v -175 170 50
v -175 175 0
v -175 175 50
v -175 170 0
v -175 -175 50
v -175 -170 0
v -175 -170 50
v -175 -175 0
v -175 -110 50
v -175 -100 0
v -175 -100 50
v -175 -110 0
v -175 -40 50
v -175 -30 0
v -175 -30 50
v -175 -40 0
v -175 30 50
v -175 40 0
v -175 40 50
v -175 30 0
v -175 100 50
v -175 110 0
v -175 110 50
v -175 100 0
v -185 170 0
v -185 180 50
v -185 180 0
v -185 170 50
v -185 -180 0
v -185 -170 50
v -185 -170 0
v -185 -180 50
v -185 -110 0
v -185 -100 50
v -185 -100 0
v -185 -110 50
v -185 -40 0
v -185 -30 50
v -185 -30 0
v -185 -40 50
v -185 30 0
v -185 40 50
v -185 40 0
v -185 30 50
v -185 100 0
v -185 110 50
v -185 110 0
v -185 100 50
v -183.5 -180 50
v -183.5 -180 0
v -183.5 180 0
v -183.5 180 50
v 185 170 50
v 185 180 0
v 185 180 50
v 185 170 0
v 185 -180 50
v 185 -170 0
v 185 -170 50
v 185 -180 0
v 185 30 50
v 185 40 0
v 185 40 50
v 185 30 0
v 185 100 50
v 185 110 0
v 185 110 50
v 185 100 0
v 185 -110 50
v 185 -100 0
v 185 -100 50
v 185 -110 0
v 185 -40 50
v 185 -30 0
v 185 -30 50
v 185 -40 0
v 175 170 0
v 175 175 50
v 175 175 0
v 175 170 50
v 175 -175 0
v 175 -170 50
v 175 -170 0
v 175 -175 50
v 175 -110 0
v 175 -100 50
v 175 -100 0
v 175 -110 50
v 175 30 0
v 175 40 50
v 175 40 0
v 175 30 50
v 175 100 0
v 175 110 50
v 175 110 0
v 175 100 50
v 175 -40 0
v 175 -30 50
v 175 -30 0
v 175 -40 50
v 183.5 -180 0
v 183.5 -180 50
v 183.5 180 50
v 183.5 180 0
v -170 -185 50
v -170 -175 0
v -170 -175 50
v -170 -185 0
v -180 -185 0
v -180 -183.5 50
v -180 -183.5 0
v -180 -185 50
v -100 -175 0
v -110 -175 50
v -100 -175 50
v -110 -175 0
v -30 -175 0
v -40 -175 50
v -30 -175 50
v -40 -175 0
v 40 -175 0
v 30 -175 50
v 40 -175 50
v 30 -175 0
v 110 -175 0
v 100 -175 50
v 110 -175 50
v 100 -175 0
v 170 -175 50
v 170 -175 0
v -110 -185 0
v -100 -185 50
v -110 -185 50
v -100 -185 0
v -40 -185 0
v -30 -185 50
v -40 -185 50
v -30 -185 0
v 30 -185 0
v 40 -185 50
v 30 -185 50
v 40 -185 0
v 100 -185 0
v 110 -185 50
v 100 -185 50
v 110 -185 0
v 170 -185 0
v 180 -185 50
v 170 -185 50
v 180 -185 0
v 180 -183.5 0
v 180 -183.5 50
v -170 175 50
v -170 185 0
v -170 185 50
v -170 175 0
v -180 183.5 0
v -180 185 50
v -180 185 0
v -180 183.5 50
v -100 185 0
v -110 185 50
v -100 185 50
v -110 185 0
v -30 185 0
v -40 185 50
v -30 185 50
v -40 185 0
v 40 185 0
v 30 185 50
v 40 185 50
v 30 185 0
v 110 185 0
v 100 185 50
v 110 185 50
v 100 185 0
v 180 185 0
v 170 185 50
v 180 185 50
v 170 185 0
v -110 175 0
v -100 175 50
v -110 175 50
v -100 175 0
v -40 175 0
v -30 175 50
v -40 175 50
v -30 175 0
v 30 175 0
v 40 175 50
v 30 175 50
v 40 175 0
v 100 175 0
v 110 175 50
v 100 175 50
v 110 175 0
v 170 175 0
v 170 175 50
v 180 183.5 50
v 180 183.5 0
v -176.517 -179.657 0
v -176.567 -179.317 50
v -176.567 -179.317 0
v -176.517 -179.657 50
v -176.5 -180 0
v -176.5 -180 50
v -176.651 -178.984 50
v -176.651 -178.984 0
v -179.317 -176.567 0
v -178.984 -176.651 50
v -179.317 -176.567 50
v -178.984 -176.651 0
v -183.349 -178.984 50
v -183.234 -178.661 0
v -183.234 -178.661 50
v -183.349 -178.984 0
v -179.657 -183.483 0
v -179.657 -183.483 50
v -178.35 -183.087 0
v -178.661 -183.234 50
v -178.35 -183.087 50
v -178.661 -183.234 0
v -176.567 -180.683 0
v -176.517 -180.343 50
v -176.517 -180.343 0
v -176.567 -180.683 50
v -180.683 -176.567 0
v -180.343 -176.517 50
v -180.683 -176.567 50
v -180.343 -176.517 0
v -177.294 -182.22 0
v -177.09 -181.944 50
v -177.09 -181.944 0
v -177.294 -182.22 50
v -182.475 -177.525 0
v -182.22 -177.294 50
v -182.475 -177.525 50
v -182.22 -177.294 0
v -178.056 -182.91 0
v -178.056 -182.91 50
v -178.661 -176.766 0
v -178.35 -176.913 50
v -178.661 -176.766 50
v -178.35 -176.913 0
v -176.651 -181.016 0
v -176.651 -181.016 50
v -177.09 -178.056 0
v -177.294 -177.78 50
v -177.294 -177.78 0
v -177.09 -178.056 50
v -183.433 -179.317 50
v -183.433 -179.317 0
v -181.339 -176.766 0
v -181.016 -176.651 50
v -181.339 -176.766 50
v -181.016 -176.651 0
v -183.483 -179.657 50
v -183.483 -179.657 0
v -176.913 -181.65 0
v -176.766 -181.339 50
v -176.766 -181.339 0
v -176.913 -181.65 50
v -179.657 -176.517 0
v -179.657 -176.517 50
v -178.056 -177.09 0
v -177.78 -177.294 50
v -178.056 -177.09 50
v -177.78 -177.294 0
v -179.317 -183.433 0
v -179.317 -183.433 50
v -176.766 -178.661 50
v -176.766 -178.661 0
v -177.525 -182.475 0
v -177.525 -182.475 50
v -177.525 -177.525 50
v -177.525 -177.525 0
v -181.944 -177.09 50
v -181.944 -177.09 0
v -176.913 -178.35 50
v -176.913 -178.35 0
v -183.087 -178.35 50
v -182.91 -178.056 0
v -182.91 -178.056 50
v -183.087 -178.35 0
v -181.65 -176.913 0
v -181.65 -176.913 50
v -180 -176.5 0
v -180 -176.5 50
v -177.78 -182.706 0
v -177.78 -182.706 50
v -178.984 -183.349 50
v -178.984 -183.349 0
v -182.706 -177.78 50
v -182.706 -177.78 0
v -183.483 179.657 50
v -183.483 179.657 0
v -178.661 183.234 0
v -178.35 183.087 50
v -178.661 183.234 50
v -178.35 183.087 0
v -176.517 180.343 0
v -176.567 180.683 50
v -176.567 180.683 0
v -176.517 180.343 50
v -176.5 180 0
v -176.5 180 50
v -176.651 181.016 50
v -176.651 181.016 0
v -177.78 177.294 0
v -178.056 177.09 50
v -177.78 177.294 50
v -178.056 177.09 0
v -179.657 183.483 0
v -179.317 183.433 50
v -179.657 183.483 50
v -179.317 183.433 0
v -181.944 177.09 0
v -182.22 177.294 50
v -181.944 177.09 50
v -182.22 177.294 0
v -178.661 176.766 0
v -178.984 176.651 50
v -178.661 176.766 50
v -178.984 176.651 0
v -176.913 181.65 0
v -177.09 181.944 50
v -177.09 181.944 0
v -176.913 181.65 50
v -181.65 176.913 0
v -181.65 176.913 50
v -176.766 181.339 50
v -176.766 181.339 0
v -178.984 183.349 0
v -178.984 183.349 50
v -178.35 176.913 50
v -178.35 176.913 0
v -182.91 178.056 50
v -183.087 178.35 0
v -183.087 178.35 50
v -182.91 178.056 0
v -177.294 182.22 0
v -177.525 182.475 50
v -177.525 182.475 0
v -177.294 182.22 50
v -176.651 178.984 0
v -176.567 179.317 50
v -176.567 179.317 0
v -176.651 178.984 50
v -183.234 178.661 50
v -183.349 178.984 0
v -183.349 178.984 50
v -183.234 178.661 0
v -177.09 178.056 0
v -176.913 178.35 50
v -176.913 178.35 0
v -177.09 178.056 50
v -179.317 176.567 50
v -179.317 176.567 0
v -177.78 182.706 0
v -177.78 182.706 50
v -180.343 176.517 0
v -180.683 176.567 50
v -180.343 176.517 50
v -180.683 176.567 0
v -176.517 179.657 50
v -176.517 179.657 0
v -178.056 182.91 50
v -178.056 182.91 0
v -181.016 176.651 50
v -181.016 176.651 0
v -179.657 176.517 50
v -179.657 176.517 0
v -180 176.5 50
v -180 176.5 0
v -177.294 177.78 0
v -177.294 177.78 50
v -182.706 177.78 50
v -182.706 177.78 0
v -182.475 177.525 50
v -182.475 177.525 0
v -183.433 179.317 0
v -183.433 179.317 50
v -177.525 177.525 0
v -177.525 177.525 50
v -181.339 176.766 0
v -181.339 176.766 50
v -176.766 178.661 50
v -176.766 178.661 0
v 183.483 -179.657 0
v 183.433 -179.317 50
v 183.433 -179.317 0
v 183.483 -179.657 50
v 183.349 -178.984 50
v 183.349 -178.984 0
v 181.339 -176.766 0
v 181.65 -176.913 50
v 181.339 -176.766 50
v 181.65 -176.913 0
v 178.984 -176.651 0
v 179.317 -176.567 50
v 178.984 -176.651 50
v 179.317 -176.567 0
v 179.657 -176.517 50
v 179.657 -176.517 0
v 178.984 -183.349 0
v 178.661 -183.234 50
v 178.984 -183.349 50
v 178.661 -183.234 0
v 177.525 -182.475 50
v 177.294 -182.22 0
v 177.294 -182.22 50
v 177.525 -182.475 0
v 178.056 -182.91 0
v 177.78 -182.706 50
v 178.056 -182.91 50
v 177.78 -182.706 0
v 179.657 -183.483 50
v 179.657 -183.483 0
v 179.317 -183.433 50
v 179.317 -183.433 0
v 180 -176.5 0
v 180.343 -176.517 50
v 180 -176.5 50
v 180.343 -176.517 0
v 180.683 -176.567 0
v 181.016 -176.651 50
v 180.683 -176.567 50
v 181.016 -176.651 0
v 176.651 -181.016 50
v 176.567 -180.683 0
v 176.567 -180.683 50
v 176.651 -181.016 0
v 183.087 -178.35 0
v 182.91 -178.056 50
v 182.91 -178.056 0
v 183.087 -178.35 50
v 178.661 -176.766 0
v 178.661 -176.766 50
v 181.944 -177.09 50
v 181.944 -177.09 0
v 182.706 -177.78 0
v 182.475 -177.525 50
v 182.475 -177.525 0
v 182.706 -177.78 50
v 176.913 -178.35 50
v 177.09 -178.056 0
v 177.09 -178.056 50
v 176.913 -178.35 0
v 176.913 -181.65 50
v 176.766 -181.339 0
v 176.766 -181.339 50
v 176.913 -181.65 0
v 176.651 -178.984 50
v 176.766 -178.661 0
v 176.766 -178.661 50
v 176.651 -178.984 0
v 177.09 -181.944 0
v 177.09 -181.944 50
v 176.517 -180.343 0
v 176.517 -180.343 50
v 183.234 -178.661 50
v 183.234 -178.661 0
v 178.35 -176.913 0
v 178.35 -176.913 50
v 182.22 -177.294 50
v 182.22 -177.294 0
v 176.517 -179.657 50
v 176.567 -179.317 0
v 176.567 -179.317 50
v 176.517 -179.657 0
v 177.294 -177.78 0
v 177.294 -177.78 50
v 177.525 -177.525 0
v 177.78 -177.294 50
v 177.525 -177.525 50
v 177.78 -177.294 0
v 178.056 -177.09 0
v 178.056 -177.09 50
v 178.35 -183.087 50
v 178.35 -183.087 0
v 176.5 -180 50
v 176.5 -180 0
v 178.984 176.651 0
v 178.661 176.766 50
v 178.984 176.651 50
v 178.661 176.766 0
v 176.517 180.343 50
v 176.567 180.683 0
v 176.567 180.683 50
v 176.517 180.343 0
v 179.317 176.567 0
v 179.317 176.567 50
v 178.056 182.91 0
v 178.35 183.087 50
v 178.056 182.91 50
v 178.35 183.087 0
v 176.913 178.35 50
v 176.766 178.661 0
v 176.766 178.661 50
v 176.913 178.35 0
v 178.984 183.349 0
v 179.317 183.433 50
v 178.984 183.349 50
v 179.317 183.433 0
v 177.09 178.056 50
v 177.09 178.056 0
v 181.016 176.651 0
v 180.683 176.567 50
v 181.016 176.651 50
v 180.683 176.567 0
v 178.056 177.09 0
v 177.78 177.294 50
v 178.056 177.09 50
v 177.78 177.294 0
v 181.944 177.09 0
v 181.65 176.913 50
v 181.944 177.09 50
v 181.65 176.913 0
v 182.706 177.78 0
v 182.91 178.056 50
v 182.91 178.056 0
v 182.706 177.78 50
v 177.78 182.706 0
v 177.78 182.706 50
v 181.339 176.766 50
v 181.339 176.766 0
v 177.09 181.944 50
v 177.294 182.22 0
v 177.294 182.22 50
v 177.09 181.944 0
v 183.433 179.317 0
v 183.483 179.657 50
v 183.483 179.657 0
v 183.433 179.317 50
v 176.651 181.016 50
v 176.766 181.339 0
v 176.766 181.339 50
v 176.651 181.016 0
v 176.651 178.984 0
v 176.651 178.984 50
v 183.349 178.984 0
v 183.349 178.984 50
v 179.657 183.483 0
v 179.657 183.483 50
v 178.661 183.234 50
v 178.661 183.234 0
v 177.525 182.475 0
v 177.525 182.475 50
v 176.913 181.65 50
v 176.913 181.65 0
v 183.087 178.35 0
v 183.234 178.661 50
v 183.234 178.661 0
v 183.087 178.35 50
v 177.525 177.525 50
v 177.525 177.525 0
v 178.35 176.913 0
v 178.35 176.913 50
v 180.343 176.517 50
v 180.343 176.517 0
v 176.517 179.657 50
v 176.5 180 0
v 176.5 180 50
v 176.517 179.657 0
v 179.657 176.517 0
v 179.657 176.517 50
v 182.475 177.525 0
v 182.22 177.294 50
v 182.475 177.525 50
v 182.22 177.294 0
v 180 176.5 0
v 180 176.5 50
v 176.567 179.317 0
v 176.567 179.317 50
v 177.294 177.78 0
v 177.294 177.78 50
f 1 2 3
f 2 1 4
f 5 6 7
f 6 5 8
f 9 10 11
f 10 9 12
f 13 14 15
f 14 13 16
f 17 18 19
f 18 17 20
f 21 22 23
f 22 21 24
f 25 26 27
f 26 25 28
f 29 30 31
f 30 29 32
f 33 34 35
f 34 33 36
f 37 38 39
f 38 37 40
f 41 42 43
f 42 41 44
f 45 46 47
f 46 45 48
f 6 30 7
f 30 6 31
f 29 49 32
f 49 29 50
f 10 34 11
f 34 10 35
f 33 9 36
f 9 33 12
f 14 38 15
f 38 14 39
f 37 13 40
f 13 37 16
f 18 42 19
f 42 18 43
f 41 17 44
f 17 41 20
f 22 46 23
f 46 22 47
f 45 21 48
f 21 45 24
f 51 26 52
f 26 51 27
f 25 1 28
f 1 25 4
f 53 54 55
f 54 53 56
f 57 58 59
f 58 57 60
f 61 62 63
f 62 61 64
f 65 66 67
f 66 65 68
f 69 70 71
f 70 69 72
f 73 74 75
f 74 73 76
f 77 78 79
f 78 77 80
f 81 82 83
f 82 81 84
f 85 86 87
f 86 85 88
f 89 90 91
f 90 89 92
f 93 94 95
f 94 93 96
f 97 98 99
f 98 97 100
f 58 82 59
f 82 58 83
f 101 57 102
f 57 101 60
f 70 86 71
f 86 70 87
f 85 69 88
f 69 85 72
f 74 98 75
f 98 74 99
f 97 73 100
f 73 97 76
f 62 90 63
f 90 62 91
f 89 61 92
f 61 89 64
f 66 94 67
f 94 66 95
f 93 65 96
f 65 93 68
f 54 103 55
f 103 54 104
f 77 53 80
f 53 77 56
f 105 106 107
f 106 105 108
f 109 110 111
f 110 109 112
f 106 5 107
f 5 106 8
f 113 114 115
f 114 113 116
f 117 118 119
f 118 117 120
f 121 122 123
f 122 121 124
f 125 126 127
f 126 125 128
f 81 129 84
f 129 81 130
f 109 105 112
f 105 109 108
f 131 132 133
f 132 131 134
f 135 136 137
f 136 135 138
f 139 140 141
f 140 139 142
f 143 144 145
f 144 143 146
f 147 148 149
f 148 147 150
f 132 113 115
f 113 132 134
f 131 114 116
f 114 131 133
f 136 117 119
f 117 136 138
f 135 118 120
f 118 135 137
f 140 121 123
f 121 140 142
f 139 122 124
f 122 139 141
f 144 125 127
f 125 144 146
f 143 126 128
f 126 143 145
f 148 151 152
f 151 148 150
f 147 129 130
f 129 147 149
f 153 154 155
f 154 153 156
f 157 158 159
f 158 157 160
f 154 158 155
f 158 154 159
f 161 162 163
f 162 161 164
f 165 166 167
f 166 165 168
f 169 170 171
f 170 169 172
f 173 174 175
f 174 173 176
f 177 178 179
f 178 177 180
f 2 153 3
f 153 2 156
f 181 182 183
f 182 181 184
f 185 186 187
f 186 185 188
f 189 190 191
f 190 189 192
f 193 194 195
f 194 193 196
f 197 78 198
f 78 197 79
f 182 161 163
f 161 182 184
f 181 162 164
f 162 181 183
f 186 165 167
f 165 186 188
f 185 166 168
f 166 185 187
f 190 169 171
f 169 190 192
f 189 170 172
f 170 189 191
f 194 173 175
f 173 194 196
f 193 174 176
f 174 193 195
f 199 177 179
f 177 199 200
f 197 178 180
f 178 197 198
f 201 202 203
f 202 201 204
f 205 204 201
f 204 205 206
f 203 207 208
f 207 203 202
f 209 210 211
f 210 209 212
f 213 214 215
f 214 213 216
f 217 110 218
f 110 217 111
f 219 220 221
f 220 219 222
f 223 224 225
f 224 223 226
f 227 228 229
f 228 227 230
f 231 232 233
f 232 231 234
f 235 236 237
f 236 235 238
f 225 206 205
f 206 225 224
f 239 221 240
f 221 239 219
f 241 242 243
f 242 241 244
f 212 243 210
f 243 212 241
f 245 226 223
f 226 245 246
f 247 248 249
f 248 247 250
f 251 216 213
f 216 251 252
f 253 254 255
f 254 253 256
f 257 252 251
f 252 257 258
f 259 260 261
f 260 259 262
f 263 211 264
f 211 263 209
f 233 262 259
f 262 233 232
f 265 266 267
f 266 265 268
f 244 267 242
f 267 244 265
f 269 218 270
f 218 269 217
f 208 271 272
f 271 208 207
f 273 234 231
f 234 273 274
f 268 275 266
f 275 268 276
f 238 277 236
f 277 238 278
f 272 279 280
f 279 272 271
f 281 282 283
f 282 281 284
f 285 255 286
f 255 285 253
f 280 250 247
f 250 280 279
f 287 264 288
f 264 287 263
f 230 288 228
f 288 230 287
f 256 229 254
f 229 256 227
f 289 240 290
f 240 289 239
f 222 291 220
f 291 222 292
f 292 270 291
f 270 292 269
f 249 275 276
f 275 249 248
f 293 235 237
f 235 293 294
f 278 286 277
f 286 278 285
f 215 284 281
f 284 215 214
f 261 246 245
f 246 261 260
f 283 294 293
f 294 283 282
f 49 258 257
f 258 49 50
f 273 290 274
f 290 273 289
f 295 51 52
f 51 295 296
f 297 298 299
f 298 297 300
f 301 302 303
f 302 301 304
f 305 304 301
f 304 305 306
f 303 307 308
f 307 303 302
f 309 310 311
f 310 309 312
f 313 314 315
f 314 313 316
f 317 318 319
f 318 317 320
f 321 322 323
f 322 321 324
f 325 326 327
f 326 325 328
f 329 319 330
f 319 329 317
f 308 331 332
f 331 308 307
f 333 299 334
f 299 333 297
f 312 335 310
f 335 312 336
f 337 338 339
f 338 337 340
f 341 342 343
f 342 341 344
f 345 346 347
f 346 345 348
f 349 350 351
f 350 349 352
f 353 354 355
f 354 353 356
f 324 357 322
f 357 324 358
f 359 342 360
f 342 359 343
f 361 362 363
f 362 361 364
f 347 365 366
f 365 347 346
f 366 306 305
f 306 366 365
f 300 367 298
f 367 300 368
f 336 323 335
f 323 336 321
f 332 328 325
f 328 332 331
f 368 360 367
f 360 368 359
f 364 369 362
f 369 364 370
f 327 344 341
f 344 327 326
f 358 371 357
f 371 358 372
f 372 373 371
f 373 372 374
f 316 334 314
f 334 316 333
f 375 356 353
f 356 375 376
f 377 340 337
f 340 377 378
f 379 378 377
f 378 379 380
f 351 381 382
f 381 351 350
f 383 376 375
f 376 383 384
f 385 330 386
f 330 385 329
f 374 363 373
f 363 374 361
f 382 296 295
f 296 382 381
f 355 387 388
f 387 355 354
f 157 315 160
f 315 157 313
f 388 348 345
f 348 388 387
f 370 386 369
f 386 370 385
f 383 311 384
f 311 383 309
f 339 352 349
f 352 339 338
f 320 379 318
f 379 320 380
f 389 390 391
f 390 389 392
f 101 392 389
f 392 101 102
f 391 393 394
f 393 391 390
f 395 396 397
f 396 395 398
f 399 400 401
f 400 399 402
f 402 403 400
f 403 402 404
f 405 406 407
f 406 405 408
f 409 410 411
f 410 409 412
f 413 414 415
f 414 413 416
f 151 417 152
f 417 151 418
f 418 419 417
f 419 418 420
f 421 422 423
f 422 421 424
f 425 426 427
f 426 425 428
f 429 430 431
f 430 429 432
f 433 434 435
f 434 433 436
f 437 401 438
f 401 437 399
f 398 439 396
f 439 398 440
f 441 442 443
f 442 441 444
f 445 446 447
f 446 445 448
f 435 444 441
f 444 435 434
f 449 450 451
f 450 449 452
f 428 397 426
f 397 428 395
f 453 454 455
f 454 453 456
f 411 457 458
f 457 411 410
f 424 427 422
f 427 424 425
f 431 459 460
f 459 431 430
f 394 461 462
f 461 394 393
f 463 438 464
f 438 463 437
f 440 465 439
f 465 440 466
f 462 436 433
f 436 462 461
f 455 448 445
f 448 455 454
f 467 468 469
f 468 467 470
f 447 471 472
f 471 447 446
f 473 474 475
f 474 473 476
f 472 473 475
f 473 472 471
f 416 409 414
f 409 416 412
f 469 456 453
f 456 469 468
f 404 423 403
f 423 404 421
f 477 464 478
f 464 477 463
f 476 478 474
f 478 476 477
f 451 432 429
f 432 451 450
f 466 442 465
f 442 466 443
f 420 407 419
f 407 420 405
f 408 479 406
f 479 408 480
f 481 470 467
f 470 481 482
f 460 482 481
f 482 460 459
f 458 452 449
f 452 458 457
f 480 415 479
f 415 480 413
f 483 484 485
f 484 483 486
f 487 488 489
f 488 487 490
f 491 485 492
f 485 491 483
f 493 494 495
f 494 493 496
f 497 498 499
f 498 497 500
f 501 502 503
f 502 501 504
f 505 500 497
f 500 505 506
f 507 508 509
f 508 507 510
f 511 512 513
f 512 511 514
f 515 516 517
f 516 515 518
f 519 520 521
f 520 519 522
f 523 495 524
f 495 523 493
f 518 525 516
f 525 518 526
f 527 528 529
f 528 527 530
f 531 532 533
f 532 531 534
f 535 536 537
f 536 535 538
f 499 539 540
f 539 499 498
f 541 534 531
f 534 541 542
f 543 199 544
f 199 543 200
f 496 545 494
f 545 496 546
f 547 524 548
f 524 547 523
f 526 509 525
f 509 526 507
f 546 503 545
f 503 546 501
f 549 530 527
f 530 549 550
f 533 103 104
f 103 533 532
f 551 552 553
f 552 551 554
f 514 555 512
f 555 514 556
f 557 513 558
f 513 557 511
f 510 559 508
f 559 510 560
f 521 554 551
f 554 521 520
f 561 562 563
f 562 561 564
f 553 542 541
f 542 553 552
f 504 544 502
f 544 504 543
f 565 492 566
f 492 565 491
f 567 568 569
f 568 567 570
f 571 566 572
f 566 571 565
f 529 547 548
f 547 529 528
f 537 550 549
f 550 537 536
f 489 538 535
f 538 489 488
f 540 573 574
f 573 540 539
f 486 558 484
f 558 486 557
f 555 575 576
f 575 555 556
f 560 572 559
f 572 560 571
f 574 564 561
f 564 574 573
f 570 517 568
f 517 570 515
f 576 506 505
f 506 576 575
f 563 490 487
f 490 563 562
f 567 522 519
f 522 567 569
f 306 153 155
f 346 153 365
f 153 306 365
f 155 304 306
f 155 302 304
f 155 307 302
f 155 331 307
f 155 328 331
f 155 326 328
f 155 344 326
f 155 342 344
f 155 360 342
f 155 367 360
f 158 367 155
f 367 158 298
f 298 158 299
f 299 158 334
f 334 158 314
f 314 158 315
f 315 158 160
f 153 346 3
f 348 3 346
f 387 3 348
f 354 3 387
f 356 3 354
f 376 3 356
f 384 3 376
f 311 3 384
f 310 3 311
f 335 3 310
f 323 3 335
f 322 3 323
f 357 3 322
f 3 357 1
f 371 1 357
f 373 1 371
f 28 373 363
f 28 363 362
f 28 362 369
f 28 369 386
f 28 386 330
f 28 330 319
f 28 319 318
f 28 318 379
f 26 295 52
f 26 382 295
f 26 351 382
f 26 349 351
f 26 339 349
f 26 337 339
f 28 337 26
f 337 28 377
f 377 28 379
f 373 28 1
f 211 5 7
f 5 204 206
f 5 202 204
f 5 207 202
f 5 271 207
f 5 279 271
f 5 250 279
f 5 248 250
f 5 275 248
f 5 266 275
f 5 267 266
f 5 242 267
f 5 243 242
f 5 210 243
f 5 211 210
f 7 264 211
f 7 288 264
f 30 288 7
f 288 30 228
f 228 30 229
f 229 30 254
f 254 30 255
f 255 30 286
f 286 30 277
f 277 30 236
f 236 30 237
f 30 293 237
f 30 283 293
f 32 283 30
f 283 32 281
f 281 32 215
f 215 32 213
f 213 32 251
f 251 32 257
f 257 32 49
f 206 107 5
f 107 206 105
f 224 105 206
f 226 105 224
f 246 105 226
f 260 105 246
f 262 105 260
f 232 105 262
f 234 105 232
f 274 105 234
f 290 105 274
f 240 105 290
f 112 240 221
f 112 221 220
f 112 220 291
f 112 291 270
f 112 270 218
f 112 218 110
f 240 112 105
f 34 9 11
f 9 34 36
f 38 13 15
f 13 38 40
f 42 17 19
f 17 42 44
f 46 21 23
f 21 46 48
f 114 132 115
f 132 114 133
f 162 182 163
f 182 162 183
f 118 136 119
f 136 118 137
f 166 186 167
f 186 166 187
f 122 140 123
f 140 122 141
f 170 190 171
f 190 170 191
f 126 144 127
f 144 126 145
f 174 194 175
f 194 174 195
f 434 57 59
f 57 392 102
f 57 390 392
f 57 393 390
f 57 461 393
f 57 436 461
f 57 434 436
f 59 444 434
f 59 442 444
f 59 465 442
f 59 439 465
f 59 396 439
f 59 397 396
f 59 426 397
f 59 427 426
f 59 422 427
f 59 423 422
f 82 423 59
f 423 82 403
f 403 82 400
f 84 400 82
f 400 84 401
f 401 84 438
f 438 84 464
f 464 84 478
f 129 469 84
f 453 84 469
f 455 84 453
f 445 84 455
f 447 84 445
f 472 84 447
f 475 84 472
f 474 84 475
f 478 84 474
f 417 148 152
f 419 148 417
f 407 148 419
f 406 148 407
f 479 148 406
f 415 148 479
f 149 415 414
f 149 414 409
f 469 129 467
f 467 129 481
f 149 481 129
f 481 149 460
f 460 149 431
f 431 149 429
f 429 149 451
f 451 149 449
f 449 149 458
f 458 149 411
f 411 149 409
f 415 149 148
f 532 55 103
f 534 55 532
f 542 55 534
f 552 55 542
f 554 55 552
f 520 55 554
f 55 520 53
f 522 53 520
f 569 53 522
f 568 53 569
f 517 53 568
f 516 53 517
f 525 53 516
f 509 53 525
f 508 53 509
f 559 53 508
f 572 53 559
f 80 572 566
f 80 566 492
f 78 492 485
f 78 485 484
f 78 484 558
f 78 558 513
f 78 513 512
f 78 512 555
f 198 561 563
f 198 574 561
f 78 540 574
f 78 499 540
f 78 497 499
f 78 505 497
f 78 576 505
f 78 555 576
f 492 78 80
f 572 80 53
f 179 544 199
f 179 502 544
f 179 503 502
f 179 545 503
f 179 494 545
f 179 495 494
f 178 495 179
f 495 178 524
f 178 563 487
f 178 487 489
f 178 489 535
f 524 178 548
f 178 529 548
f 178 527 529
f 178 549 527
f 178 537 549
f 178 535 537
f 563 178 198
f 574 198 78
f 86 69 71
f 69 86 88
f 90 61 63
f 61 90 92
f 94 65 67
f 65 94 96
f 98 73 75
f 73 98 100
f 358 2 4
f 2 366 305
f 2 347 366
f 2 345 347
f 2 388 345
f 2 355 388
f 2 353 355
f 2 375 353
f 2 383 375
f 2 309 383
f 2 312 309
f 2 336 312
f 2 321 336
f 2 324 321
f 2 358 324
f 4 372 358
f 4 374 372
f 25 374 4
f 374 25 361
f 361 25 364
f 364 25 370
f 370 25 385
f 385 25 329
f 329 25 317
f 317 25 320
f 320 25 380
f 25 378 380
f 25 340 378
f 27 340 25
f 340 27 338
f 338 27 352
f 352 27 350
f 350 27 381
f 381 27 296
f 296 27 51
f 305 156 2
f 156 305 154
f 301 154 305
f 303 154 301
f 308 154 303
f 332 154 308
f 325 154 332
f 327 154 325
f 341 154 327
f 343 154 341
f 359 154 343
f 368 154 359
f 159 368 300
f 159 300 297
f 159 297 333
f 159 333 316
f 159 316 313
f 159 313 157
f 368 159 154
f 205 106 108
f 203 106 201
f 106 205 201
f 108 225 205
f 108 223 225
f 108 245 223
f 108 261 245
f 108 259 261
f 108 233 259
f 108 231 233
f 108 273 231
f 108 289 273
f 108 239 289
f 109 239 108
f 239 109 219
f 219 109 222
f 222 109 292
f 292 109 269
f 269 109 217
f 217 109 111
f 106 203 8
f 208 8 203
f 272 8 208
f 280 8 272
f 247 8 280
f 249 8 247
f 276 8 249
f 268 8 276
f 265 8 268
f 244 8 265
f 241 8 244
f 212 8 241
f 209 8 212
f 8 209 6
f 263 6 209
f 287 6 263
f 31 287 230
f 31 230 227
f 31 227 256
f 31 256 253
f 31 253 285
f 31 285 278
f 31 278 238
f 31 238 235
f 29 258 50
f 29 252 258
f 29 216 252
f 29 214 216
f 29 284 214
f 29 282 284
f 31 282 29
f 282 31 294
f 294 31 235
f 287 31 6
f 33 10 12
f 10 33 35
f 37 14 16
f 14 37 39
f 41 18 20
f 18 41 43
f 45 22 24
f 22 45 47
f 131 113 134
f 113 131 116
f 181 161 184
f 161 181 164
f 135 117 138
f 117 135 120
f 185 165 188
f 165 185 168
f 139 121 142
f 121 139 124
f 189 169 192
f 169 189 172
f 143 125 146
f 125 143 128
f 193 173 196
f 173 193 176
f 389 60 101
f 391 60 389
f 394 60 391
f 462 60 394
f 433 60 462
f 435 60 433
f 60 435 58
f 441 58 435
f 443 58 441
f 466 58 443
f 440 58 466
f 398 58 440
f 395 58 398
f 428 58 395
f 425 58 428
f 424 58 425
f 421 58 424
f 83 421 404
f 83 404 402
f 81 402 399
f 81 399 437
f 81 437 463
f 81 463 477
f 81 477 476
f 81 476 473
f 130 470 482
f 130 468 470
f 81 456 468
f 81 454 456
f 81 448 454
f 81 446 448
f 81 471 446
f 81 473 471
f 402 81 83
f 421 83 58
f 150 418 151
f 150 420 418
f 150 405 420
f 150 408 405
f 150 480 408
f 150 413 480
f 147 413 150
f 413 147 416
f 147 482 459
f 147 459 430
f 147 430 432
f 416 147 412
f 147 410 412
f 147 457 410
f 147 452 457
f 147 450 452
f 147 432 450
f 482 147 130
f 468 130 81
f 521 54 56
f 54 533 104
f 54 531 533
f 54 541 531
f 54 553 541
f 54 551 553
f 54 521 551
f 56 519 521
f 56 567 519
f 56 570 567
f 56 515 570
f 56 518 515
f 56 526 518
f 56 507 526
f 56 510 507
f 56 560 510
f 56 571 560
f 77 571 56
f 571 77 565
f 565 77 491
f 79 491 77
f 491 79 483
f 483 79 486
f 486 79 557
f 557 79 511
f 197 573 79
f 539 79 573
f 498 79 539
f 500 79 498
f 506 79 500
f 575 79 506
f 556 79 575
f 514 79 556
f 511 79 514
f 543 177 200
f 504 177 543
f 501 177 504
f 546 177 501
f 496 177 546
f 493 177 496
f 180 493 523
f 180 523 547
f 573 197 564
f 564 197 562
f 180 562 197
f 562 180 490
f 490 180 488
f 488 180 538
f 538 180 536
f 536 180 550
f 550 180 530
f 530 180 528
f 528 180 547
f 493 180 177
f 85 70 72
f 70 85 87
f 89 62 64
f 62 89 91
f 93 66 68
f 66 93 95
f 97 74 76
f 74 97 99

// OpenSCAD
/*
  Cage slice 07 of 15
*/

bar = 10;
half_inner = 175;
gap = 70;
rod_d = 7;
half_outer = half_inner + bar;

function grid_pos(n) = -half_inner + n * gap;

module cage_full() {
  difference() {
    union() {
      // Floor grid at z = -10 .. 0
      for (j = [0:5]) {
        y = grid_pos(j);
        translate([-half_inner, y - bar/2, -bar])
          cube([2*half_inner, bar, bar], center=false);
      }
      for (i = [0:5]) {
        x = grid_pos(i);
        translate([x - bar/2, -half_inner, -bar])
          cube([bar, 2*half_inner, bar], center=false);
      }

      // Roof grid at z = 700 .. 710
      for (j = [0:5]) {
        y = grid_pos(j);
        translate([-half_inner, y - bar/2, 700])
          cube([2*half_inner, bar, bar], center=false);
      }
      for (i = [0:5]) {
        x = grid_pos(i);
        translate([x - bar/2, -half_inner, 700])
          cube([bar, 2*half_inner, bar], center=false);
      }

      // Side walls at x = ±175
      for (side = [-1, 1]) {
        sx = side * half_inner;
        x0 = (side == 1) ? sx : sx - bar;
        for (j = [0:5]) {
          y = grid_pos(j);
          translate([x0, y - bar/2, 0])
            cube([bar, bar, 700], center=false);
        }
        for (k = [0:10]) {
          zc = 0 + k * gap;
          translate([x0, -half_inner, zc - bar/2])
            cube([bar, 2*half_inner, bar], center=false);
        }
      }

      // Front/back walls at y = ±175
      for (side = [-1, 1]) {
        sy = side * half_inner;
        y0 = (side == 1) ? sy : sy - bar;
        for (i = [0:5]) {
          x = grid_pos(i);
          translate([x - bar/2, y0, 0])
            cube([bar, bar, 700], center=false);
        }
        for (k = [0:10]) {
          zc = 0 + k * gap;
          translate([-half_inner, y0, zc - bar/2])
            cube([2*half_inner, bar, bar], center=false);
        }
      }
    }

    for (sx = [-1, 1], sy = [-1, 1]) {
      translate([sx * (half_inner + bar/2),
                 sy * (half_inner + bar/2),
                 -20])
        cylinder(d = rod_d, h = 740, $fn = 64);
    }
  }
}

z_min = 290;
z_max = 340;  // height 50 mm

module slice() {
  intersection() {
    cage_full();
    translate([-half_outer - 5, -half_outer - 5, z_min])
      cube([2*(half_outer + 5), 2*(half_outer + 5), z_max - z_min], center=false);
  }
}

translate([0, 0, -z_min])
  slice();
